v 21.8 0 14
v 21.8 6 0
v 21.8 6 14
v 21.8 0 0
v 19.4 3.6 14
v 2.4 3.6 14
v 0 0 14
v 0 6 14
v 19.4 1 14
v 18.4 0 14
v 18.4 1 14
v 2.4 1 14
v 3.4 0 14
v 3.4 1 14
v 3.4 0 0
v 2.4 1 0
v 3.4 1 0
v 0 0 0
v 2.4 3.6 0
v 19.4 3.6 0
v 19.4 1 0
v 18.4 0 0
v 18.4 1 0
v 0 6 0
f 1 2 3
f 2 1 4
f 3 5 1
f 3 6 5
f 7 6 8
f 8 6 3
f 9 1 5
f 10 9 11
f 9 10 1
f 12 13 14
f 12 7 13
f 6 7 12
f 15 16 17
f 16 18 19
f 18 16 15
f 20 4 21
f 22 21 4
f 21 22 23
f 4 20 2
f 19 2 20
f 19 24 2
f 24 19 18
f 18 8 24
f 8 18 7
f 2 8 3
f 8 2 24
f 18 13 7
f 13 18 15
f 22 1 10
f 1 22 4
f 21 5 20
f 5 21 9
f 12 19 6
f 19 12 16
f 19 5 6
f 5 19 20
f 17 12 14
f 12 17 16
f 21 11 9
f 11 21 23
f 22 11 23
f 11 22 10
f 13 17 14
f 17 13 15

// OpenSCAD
t0 = 2.4;
t = 1;
g = 0.1;
o = 1;

l = 17;
h = 14;

difference(){

    cube([l + 2 * t0, 2*t0 + 2*g + t, h], center=false);
    translate([t0, t, 0])
    cube([l, t0 + 2*g, h], center=false);
    translate([t0 + o, 0, 0])
    cube([l - 2*o, t0, h], center=false);
}
